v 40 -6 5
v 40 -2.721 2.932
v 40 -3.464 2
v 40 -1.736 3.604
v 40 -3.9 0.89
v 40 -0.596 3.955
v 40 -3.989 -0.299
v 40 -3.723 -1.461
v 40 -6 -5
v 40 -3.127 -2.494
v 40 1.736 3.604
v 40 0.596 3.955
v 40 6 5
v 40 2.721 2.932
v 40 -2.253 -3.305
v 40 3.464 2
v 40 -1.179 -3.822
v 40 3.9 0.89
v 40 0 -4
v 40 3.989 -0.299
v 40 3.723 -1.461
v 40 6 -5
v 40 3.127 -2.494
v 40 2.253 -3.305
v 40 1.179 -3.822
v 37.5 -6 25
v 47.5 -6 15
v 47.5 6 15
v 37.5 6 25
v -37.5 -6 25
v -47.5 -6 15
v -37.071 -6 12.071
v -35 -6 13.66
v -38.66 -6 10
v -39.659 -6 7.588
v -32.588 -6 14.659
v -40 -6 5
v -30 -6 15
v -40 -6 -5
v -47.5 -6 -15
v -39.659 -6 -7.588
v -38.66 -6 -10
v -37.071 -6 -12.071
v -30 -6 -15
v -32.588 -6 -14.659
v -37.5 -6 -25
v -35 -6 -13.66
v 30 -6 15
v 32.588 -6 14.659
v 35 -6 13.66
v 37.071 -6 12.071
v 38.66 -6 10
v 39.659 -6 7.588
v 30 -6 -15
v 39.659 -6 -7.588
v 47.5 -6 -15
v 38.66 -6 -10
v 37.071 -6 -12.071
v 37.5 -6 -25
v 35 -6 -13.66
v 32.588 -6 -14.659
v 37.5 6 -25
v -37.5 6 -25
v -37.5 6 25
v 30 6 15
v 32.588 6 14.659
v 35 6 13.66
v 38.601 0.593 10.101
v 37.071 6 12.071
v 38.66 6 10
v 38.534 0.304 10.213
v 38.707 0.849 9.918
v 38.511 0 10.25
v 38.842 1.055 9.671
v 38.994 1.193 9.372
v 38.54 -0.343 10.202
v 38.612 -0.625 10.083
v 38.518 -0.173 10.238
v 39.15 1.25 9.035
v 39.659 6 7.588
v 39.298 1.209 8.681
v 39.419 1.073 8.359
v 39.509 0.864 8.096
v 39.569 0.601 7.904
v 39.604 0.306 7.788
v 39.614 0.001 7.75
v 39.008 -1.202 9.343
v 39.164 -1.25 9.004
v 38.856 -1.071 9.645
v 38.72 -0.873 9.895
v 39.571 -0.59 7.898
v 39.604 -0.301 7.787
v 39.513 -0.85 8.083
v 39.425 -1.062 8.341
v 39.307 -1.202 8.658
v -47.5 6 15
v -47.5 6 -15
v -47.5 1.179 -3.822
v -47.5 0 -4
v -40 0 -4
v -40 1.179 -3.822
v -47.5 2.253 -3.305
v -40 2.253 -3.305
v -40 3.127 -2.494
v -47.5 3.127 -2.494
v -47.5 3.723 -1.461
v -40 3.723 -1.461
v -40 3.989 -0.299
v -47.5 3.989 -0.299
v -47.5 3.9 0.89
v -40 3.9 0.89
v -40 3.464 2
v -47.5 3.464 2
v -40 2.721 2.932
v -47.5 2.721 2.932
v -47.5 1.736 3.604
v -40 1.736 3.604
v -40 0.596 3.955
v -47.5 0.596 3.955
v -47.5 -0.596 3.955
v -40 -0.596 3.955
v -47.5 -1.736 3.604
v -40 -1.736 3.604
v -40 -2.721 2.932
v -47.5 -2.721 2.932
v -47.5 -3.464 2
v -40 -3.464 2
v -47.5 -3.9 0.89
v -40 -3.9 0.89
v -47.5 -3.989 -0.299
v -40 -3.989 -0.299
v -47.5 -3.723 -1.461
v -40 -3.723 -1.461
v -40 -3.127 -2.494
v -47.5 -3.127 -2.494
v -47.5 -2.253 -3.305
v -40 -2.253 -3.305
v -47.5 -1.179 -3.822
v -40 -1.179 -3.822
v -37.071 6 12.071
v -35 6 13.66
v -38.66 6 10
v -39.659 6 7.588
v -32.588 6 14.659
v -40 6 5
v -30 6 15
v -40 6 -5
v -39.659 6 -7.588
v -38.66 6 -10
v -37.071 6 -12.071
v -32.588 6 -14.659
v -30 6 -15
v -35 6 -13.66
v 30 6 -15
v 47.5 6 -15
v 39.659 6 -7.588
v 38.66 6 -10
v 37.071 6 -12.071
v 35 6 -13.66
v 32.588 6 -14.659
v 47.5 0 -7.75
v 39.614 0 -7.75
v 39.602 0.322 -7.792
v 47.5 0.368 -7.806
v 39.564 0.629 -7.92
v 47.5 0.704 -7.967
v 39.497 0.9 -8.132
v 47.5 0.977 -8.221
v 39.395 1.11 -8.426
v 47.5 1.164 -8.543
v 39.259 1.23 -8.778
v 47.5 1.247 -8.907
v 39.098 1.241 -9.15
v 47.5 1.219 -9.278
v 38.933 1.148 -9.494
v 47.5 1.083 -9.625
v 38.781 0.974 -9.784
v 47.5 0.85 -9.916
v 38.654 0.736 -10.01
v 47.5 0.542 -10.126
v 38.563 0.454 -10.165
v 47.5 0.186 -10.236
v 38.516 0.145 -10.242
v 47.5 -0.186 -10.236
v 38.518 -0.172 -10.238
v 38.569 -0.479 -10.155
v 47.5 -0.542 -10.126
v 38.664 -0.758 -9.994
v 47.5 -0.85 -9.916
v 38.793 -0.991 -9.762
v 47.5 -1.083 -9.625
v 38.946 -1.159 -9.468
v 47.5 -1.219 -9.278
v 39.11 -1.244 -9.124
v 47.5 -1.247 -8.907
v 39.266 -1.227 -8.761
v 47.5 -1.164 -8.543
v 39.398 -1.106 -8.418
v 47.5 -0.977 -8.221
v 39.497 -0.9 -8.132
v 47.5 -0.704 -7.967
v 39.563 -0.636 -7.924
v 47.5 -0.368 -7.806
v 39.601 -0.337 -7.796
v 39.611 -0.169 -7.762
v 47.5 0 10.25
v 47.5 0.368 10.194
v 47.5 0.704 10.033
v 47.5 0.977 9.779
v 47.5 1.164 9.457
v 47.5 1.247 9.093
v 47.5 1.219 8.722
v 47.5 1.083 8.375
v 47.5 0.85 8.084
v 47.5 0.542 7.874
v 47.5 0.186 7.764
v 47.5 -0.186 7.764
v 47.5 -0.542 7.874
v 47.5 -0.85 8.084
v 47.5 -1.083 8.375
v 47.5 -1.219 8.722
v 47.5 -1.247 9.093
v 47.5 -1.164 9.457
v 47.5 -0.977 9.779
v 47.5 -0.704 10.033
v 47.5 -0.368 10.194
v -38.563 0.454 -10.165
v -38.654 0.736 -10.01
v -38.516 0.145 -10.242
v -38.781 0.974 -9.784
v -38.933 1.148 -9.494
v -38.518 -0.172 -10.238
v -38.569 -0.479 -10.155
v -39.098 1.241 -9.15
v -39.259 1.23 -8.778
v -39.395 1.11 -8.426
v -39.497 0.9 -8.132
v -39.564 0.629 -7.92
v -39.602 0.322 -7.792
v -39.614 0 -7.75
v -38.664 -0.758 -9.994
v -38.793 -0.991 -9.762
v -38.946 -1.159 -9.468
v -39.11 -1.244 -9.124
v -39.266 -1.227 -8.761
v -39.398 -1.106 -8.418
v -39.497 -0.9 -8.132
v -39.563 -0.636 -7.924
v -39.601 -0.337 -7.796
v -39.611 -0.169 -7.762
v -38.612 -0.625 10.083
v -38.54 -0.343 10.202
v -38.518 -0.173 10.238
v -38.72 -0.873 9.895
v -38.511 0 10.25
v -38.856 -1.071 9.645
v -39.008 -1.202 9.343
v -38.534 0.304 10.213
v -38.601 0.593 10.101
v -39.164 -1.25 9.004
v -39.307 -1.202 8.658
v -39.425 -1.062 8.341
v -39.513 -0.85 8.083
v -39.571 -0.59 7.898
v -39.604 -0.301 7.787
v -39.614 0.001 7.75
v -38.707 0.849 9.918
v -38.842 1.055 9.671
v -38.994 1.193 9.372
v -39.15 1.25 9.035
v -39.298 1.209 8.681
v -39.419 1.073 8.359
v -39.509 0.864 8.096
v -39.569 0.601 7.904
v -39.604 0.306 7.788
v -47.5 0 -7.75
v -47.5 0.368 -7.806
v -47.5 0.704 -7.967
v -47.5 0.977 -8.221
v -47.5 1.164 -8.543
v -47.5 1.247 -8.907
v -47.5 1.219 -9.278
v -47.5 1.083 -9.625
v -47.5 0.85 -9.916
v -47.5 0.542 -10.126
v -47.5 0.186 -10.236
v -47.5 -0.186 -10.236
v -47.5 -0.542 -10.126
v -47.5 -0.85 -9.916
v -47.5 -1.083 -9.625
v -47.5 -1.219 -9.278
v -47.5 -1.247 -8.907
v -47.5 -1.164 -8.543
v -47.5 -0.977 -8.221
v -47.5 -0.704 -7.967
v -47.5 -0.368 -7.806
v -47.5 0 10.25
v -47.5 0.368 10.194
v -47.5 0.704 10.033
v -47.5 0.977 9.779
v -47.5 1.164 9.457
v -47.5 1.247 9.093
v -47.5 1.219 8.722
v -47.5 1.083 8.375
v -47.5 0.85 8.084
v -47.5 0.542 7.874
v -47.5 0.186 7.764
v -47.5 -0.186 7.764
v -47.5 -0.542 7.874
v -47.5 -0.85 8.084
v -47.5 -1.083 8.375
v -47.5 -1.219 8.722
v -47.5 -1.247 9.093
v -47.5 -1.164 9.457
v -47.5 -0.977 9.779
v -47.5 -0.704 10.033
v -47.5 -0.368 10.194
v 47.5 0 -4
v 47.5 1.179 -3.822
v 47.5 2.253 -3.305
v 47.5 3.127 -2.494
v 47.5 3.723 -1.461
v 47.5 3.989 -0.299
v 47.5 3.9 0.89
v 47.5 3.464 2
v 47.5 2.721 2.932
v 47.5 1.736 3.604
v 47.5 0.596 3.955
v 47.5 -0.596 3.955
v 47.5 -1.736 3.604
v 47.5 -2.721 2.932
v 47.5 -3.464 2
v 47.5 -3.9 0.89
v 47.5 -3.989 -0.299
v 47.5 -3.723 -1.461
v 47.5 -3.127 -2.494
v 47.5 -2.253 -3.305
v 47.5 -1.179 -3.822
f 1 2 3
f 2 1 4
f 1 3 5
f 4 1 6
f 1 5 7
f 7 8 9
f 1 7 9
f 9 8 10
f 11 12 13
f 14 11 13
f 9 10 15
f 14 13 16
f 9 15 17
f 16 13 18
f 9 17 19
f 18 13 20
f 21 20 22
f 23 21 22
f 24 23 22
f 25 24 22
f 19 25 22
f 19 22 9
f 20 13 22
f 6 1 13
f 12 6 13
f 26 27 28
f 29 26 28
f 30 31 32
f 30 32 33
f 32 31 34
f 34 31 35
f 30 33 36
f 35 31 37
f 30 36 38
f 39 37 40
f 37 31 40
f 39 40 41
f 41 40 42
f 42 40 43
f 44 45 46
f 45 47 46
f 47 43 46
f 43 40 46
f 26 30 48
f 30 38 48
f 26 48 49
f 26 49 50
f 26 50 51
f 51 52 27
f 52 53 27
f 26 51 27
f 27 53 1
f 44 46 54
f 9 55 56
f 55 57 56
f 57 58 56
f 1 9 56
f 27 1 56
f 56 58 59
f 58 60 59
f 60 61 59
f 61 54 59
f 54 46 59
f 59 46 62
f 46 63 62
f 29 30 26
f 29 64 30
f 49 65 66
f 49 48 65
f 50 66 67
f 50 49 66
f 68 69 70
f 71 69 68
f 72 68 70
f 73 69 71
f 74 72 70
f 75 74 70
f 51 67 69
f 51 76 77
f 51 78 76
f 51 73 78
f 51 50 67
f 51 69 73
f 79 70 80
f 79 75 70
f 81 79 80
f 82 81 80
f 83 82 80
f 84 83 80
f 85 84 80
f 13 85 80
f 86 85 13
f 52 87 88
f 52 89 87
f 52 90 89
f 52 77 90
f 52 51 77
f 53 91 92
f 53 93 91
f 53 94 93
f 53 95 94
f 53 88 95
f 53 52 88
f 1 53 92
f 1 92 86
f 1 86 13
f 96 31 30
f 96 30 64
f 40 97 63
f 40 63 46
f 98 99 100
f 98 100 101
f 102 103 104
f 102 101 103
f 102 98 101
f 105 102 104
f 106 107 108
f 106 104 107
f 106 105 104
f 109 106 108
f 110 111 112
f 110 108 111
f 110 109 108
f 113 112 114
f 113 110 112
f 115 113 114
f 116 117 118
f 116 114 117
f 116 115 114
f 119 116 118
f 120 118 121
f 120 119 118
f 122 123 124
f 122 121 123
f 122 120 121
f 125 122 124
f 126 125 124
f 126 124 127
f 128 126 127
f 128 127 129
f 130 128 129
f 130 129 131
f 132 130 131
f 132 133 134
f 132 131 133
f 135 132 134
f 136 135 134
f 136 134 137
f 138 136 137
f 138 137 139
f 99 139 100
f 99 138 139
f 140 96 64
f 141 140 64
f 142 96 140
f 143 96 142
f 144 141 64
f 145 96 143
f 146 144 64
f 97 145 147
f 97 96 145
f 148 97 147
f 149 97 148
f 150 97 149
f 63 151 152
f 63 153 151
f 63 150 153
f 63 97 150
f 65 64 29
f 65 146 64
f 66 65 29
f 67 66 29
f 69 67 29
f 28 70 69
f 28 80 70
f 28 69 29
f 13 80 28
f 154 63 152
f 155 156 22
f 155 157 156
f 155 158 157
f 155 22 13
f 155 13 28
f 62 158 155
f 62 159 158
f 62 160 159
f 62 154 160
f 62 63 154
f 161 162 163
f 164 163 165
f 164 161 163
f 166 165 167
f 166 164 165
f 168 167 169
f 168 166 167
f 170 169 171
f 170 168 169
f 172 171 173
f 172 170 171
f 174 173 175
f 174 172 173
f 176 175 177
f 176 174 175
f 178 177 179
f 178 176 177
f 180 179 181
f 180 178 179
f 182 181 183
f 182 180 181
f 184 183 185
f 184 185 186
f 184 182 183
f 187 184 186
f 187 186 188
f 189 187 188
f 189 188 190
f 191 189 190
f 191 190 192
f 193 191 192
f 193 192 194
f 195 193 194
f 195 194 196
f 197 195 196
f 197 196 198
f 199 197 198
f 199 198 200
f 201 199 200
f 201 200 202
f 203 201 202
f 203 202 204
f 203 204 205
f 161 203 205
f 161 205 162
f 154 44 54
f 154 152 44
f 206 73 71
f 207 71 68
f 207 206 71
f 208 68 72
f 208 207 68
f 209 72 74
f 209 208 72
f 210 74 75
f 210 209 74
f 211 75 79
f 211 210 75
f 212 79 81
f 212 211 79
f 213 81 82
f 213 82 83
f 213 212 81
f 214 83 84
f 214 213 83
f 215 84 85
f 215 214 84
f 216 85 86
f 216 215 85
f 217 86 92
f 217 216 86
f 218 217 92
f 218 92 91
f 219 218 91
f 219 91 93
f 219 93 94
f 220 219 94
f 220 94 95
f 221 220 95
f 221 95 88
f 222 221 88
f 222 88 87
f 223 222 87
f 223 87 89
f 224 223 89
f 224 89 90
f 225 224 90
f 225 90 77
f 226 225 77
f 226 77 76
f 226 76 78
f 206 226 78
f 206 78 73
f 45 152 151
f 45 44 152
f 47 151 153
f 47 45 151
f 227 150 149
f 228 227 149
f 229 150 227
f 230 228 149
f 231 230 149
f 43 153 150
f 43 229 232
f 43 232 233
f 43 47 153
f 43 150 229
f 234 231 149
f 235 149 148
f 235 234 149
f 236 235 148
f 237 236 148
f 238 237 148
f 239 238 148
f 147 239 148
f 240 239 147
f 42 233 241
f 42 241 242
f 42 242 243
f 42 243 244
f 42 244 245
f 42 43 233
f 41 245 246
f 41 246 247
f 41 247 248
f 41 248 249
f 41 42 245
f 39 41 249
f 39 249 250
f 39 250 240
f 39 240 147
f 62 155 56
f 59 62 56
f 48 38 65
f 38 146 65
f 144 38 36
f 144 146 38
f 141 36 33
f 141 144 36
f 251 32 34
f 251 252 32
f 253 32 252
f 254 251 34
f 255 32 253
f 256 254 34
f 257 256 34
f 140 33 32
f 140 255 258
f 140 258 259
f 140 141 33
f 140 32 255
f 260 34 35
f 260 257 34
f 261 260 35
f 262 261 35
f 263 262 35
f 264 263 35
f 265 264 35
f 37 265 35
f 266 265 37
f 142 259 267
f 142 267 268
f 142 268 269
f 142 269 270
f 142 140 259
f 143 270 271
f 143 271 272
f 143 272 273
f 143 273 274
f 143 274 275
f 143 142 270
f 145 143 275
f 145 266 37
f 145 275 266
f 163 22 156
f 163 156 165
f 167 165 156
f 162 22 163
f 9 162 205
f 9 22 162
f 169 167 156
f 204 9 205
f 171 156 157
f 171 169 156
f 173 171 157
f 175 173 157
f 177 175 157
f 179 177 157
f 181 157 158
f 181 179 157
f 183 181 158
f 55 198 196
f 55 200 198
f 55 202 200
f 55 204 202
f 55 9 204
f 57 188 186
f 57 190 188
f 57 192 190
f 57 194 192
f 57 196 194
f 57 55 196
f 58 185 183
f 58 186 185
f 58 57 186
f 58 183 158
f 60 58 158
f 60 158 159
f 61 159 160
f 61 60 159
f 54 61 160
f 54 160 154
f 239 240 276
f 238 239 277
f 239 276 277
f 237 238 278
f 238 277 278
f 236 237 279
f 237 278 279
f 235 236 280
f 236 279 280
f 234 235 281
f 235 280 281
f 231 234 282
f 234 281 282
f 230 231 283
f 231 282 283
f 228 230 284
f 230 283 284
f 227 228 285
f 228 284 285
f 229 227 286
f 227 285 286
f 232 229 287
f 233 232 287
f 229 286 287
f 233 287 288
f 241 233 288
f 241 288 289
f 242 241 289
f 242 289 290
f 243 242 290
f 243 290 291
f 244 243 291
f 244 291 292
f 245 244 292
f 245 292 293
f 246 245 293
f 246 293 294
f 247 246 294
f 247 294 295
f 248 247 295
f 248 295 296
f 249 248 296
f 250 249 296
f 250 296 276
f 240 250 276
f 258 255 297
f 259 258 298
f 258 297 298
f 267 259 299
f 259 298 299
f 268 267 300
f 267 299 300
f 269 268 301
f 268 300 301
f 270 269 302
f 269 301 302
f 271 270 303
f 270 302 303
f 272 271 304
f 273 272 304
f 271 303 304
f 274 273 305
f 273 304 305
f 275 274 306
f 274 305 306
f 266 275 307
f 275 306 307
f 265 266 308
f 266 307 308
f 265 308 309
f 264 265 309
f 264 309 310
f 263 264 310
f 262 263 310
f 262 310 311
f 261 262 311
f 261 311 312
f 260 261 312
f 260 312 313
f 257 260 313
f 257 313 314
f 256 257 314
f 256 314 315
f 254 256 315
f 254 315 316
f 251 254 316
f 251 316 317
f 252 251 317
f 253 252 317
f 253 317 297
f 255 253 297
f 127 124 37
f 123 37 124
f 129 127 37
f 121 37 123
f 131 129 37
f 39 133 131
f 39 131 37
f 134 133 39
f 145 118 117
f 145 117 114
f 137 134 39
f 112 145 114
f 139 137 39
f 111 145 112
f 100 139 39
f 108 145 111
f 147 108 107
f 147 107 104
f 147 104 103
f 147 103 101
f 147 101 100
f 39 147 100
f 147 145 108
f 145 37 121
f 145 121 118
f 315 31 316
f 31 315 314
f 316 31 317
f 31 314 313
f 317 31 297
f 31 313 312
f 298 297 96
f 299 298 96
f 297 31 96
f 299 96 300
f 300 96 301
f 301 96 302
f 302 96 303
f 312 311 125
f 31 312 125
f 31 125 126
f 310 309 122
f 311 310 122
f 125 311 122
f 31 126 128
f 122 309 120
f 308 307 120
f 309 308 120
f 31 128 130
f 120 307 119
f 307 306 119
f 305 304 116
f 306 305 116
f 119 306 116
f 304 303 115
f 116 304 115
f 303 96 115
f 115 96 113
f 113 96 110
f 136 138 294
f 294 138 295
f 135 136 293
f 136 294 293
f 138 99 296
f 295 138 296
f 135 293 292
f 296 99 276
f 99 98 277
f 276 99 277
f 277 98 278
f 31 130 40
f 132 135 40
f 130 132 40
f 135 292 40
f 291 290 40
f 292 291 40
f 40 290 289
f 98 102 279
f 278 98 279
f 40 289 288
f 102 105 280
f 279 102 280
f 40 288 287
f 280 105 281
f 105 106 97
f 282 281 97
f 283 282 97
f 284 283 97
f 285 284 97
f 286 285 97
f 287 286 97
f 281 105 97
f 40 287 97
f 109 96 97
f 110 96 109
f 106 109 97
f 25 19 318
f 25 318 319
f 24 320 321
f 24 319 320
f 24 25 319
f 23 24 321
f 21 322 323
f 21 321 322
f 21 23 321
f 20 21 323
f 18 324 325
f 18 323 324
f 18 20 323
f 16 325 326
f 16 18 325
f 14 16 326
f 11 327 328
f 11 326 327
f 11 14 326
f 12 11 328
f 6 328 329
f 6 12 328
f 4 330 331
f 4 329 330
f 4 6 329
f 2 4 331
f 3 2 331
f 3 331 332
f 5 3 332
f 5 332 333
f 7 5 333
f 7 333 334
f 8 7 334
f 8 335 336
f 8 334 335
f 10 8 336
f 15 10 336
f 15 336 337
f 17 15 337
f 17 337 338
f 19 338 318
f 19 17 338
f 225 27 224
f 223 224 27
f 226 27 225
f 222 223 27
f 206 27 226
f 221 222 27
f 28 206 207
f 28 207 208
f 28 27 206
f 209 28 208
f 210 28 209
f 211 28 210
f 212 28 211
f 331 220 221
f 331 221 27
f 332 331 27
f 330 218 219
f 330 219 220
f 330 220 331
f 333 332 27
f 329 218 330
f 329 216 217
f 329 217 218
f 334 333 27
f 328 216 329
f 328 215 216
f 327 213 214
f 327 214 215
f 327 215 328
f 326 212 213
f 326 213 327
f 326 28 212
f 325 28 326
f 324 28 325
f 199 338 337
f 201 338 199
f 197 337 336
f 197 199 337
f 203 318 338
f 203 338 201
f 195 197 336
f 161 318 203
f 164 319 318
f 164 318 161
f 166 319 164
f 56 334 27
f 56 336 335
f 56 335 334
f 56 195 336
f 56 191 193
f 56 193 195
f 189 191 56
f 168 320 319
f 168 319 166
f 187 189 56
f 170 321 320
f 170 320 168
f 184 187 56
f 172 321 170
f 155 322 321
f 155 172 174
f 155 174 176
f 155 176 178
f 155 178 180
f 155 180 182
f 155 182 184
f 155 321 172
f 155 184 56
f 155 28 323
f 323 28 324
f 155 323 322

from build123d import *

# Parameters (mm, degrees)
SKETCH2_W                  = 95
SKETCH2_H                  = 50
SKETCH2_W_2                = 80
SKETCH2_H_2                = 30
BOSS_EXTRUDE1_DEPTH        = 6
CUT_EXTRUDE1_DEPTH         = 55.011572834
CUT_EXTRUDE1_DEPTH_BACK    = 55.011572834
SKETCH4_R                  = 4
FILLET1_R                  = 10
M3X0_5_TAPPED_HOLE1_REACH  = 100.417
M3X0_5_TAPPED_HOLE1_BORE_R = 1.25
CHAMFER1_SIZE              = 10


with BuildPart() as part:
    # Sketch2 → Boss-Extrude1 (new, symmetric)
    with BuildSketch(Plane(origin=(0, 0, 0), x_dir=(1, 0, 0), z_dir=(0, 1, 0))):
        Rectangle(SKETCH2_W, SKETCH2_H)
        Rectangle(SKETCH2_W_2, SKETCH2_H_2, mode=Mode.SUBTRACT)
    extrude(amount=BOSS_EXTRUDE1_DEPTH, both=True)

    # Sketch4 → Cut-Extrude1 (cut, two sides: drawn at the far end of the back side and taken through both)
    with BuildSketch(Plane(origin=(0, 0, 0), x_dir=(0, 0, -1), z_dir=(1, 0, 0)).offset(-CUT_EXTRUDE1_DEPTH_BACK)):
        Circle(SKETCH4_R)
    extrude(amount=CUT_EXTRUDE1_DEPTH + CUT_EXTRUDE1_DEPTH_BACK, mode=Mode.SUBTRACT)

    # Fillet1
    fillet1_edges = [part.edges().sort_by_distance(p)[0] for p in [
        (40, 0, 15),
        (40, 0, -15),
        (-40, 0, -15),
        (-40, 0, 15),
    ]]
    fillet(fillet1_edges, radius=FILLET1_R)

    # M3x0.5 Tapped Hole1 bore → M3x0.5 Tapped Hole1 (cut, up to next)
    with BuildSketch(Plane.ZY.offset(47.5), mode=Mode.PRIVATE) as m3x0_5_tapped_hole1_sk1:
        with Locations((-9, 0)):
            Circle(M3X0_5_TAPPED_HOLE1_BORE_R)
    m3x0_5_tapped_hole1_tool1 = extrude(m3x0_5_tapped_hole1_sk1.sketch, amount=-M3X0_5_TAPPED_HOLE1_REACH, mode=Mode.PRIVATE) & part.part
    # M3x0.5 Tapped Hole1 bore → M3x0.5 Tapped Hole1 (cut, up to next)
    with BuildSketch(Plane.ZY.offset(47.5), mode=Mode.PRIVATE) as m3x0_5_tapped_hole1_sk2:
        with Locations((9, 0)):
            Circle(M3X0_5_TAPPED_HOLE1_BORE_R)
    m3x0_5_tapped_hole1_tool2 = extrude(m3x0_5_tapped_hole1_sk2.sketch, amount=-M3X0_5_TAPPED_HOLE1_REACH, mode=Mode.PRIVATE) & part.part
    m3x0_5_tapped_hole1_1 = m3x0_5_tapped_hole1_tool1.solids().sort_by_distance((-47.5, 0, -9))[0]
    add(m3x0_5_tapped_hole1_1, mode=Mode.SUBTRACT)
    m3x0_5_tapped_hole1_2 = m3x0_5_tapped_hole1_tool2.solids().sort_by_distance((-47.5, 0, 9))[0]
    add(m3x0_5_tapped_hole1_2, mode=Mode.SUBTRACT)
    m3x0_5_tapped_hole1 = m3x0_5_tapped_hole1_1 + m3x0_5_tapped_hole1_2  # M3x0.5 Tapped Hole1 as one shape, for the pattern or mirror that repeats it

    # Mirror1: M3x0.5 Tapped Hole1 across plane
    add(m3x0_5_tapped_hole1.mirror(Plane(origin=(0, 0, 0), x_dir=(0, 0, 1), z_dir=(1, 0, 0))), mode=Mode.SUBTRACT)

    # Hole Thread4: M3x0.5 Tapped Hole1 across Right Plane
    add(m3x0_5_tapped_hole1.mirror(Plane(origin=(0, 0, 0), x_dir=(0, 0, -1), z_dir=(1, 0, 0))), mode=Mode.SUBTRACT)

    # Chamfer1
    chamfer1_edges = [part.edges().sort_by_distance(p)[0] for p in [
        (47.5, 0, 25),
        (-47.5, 0, 25),
        (-47.5, 0, -25),
        (47.5, 0, -25),
    ]]
    chamfer(chamfer1_edges, length=CHAMFER1_SIZE)


solid = part.part
